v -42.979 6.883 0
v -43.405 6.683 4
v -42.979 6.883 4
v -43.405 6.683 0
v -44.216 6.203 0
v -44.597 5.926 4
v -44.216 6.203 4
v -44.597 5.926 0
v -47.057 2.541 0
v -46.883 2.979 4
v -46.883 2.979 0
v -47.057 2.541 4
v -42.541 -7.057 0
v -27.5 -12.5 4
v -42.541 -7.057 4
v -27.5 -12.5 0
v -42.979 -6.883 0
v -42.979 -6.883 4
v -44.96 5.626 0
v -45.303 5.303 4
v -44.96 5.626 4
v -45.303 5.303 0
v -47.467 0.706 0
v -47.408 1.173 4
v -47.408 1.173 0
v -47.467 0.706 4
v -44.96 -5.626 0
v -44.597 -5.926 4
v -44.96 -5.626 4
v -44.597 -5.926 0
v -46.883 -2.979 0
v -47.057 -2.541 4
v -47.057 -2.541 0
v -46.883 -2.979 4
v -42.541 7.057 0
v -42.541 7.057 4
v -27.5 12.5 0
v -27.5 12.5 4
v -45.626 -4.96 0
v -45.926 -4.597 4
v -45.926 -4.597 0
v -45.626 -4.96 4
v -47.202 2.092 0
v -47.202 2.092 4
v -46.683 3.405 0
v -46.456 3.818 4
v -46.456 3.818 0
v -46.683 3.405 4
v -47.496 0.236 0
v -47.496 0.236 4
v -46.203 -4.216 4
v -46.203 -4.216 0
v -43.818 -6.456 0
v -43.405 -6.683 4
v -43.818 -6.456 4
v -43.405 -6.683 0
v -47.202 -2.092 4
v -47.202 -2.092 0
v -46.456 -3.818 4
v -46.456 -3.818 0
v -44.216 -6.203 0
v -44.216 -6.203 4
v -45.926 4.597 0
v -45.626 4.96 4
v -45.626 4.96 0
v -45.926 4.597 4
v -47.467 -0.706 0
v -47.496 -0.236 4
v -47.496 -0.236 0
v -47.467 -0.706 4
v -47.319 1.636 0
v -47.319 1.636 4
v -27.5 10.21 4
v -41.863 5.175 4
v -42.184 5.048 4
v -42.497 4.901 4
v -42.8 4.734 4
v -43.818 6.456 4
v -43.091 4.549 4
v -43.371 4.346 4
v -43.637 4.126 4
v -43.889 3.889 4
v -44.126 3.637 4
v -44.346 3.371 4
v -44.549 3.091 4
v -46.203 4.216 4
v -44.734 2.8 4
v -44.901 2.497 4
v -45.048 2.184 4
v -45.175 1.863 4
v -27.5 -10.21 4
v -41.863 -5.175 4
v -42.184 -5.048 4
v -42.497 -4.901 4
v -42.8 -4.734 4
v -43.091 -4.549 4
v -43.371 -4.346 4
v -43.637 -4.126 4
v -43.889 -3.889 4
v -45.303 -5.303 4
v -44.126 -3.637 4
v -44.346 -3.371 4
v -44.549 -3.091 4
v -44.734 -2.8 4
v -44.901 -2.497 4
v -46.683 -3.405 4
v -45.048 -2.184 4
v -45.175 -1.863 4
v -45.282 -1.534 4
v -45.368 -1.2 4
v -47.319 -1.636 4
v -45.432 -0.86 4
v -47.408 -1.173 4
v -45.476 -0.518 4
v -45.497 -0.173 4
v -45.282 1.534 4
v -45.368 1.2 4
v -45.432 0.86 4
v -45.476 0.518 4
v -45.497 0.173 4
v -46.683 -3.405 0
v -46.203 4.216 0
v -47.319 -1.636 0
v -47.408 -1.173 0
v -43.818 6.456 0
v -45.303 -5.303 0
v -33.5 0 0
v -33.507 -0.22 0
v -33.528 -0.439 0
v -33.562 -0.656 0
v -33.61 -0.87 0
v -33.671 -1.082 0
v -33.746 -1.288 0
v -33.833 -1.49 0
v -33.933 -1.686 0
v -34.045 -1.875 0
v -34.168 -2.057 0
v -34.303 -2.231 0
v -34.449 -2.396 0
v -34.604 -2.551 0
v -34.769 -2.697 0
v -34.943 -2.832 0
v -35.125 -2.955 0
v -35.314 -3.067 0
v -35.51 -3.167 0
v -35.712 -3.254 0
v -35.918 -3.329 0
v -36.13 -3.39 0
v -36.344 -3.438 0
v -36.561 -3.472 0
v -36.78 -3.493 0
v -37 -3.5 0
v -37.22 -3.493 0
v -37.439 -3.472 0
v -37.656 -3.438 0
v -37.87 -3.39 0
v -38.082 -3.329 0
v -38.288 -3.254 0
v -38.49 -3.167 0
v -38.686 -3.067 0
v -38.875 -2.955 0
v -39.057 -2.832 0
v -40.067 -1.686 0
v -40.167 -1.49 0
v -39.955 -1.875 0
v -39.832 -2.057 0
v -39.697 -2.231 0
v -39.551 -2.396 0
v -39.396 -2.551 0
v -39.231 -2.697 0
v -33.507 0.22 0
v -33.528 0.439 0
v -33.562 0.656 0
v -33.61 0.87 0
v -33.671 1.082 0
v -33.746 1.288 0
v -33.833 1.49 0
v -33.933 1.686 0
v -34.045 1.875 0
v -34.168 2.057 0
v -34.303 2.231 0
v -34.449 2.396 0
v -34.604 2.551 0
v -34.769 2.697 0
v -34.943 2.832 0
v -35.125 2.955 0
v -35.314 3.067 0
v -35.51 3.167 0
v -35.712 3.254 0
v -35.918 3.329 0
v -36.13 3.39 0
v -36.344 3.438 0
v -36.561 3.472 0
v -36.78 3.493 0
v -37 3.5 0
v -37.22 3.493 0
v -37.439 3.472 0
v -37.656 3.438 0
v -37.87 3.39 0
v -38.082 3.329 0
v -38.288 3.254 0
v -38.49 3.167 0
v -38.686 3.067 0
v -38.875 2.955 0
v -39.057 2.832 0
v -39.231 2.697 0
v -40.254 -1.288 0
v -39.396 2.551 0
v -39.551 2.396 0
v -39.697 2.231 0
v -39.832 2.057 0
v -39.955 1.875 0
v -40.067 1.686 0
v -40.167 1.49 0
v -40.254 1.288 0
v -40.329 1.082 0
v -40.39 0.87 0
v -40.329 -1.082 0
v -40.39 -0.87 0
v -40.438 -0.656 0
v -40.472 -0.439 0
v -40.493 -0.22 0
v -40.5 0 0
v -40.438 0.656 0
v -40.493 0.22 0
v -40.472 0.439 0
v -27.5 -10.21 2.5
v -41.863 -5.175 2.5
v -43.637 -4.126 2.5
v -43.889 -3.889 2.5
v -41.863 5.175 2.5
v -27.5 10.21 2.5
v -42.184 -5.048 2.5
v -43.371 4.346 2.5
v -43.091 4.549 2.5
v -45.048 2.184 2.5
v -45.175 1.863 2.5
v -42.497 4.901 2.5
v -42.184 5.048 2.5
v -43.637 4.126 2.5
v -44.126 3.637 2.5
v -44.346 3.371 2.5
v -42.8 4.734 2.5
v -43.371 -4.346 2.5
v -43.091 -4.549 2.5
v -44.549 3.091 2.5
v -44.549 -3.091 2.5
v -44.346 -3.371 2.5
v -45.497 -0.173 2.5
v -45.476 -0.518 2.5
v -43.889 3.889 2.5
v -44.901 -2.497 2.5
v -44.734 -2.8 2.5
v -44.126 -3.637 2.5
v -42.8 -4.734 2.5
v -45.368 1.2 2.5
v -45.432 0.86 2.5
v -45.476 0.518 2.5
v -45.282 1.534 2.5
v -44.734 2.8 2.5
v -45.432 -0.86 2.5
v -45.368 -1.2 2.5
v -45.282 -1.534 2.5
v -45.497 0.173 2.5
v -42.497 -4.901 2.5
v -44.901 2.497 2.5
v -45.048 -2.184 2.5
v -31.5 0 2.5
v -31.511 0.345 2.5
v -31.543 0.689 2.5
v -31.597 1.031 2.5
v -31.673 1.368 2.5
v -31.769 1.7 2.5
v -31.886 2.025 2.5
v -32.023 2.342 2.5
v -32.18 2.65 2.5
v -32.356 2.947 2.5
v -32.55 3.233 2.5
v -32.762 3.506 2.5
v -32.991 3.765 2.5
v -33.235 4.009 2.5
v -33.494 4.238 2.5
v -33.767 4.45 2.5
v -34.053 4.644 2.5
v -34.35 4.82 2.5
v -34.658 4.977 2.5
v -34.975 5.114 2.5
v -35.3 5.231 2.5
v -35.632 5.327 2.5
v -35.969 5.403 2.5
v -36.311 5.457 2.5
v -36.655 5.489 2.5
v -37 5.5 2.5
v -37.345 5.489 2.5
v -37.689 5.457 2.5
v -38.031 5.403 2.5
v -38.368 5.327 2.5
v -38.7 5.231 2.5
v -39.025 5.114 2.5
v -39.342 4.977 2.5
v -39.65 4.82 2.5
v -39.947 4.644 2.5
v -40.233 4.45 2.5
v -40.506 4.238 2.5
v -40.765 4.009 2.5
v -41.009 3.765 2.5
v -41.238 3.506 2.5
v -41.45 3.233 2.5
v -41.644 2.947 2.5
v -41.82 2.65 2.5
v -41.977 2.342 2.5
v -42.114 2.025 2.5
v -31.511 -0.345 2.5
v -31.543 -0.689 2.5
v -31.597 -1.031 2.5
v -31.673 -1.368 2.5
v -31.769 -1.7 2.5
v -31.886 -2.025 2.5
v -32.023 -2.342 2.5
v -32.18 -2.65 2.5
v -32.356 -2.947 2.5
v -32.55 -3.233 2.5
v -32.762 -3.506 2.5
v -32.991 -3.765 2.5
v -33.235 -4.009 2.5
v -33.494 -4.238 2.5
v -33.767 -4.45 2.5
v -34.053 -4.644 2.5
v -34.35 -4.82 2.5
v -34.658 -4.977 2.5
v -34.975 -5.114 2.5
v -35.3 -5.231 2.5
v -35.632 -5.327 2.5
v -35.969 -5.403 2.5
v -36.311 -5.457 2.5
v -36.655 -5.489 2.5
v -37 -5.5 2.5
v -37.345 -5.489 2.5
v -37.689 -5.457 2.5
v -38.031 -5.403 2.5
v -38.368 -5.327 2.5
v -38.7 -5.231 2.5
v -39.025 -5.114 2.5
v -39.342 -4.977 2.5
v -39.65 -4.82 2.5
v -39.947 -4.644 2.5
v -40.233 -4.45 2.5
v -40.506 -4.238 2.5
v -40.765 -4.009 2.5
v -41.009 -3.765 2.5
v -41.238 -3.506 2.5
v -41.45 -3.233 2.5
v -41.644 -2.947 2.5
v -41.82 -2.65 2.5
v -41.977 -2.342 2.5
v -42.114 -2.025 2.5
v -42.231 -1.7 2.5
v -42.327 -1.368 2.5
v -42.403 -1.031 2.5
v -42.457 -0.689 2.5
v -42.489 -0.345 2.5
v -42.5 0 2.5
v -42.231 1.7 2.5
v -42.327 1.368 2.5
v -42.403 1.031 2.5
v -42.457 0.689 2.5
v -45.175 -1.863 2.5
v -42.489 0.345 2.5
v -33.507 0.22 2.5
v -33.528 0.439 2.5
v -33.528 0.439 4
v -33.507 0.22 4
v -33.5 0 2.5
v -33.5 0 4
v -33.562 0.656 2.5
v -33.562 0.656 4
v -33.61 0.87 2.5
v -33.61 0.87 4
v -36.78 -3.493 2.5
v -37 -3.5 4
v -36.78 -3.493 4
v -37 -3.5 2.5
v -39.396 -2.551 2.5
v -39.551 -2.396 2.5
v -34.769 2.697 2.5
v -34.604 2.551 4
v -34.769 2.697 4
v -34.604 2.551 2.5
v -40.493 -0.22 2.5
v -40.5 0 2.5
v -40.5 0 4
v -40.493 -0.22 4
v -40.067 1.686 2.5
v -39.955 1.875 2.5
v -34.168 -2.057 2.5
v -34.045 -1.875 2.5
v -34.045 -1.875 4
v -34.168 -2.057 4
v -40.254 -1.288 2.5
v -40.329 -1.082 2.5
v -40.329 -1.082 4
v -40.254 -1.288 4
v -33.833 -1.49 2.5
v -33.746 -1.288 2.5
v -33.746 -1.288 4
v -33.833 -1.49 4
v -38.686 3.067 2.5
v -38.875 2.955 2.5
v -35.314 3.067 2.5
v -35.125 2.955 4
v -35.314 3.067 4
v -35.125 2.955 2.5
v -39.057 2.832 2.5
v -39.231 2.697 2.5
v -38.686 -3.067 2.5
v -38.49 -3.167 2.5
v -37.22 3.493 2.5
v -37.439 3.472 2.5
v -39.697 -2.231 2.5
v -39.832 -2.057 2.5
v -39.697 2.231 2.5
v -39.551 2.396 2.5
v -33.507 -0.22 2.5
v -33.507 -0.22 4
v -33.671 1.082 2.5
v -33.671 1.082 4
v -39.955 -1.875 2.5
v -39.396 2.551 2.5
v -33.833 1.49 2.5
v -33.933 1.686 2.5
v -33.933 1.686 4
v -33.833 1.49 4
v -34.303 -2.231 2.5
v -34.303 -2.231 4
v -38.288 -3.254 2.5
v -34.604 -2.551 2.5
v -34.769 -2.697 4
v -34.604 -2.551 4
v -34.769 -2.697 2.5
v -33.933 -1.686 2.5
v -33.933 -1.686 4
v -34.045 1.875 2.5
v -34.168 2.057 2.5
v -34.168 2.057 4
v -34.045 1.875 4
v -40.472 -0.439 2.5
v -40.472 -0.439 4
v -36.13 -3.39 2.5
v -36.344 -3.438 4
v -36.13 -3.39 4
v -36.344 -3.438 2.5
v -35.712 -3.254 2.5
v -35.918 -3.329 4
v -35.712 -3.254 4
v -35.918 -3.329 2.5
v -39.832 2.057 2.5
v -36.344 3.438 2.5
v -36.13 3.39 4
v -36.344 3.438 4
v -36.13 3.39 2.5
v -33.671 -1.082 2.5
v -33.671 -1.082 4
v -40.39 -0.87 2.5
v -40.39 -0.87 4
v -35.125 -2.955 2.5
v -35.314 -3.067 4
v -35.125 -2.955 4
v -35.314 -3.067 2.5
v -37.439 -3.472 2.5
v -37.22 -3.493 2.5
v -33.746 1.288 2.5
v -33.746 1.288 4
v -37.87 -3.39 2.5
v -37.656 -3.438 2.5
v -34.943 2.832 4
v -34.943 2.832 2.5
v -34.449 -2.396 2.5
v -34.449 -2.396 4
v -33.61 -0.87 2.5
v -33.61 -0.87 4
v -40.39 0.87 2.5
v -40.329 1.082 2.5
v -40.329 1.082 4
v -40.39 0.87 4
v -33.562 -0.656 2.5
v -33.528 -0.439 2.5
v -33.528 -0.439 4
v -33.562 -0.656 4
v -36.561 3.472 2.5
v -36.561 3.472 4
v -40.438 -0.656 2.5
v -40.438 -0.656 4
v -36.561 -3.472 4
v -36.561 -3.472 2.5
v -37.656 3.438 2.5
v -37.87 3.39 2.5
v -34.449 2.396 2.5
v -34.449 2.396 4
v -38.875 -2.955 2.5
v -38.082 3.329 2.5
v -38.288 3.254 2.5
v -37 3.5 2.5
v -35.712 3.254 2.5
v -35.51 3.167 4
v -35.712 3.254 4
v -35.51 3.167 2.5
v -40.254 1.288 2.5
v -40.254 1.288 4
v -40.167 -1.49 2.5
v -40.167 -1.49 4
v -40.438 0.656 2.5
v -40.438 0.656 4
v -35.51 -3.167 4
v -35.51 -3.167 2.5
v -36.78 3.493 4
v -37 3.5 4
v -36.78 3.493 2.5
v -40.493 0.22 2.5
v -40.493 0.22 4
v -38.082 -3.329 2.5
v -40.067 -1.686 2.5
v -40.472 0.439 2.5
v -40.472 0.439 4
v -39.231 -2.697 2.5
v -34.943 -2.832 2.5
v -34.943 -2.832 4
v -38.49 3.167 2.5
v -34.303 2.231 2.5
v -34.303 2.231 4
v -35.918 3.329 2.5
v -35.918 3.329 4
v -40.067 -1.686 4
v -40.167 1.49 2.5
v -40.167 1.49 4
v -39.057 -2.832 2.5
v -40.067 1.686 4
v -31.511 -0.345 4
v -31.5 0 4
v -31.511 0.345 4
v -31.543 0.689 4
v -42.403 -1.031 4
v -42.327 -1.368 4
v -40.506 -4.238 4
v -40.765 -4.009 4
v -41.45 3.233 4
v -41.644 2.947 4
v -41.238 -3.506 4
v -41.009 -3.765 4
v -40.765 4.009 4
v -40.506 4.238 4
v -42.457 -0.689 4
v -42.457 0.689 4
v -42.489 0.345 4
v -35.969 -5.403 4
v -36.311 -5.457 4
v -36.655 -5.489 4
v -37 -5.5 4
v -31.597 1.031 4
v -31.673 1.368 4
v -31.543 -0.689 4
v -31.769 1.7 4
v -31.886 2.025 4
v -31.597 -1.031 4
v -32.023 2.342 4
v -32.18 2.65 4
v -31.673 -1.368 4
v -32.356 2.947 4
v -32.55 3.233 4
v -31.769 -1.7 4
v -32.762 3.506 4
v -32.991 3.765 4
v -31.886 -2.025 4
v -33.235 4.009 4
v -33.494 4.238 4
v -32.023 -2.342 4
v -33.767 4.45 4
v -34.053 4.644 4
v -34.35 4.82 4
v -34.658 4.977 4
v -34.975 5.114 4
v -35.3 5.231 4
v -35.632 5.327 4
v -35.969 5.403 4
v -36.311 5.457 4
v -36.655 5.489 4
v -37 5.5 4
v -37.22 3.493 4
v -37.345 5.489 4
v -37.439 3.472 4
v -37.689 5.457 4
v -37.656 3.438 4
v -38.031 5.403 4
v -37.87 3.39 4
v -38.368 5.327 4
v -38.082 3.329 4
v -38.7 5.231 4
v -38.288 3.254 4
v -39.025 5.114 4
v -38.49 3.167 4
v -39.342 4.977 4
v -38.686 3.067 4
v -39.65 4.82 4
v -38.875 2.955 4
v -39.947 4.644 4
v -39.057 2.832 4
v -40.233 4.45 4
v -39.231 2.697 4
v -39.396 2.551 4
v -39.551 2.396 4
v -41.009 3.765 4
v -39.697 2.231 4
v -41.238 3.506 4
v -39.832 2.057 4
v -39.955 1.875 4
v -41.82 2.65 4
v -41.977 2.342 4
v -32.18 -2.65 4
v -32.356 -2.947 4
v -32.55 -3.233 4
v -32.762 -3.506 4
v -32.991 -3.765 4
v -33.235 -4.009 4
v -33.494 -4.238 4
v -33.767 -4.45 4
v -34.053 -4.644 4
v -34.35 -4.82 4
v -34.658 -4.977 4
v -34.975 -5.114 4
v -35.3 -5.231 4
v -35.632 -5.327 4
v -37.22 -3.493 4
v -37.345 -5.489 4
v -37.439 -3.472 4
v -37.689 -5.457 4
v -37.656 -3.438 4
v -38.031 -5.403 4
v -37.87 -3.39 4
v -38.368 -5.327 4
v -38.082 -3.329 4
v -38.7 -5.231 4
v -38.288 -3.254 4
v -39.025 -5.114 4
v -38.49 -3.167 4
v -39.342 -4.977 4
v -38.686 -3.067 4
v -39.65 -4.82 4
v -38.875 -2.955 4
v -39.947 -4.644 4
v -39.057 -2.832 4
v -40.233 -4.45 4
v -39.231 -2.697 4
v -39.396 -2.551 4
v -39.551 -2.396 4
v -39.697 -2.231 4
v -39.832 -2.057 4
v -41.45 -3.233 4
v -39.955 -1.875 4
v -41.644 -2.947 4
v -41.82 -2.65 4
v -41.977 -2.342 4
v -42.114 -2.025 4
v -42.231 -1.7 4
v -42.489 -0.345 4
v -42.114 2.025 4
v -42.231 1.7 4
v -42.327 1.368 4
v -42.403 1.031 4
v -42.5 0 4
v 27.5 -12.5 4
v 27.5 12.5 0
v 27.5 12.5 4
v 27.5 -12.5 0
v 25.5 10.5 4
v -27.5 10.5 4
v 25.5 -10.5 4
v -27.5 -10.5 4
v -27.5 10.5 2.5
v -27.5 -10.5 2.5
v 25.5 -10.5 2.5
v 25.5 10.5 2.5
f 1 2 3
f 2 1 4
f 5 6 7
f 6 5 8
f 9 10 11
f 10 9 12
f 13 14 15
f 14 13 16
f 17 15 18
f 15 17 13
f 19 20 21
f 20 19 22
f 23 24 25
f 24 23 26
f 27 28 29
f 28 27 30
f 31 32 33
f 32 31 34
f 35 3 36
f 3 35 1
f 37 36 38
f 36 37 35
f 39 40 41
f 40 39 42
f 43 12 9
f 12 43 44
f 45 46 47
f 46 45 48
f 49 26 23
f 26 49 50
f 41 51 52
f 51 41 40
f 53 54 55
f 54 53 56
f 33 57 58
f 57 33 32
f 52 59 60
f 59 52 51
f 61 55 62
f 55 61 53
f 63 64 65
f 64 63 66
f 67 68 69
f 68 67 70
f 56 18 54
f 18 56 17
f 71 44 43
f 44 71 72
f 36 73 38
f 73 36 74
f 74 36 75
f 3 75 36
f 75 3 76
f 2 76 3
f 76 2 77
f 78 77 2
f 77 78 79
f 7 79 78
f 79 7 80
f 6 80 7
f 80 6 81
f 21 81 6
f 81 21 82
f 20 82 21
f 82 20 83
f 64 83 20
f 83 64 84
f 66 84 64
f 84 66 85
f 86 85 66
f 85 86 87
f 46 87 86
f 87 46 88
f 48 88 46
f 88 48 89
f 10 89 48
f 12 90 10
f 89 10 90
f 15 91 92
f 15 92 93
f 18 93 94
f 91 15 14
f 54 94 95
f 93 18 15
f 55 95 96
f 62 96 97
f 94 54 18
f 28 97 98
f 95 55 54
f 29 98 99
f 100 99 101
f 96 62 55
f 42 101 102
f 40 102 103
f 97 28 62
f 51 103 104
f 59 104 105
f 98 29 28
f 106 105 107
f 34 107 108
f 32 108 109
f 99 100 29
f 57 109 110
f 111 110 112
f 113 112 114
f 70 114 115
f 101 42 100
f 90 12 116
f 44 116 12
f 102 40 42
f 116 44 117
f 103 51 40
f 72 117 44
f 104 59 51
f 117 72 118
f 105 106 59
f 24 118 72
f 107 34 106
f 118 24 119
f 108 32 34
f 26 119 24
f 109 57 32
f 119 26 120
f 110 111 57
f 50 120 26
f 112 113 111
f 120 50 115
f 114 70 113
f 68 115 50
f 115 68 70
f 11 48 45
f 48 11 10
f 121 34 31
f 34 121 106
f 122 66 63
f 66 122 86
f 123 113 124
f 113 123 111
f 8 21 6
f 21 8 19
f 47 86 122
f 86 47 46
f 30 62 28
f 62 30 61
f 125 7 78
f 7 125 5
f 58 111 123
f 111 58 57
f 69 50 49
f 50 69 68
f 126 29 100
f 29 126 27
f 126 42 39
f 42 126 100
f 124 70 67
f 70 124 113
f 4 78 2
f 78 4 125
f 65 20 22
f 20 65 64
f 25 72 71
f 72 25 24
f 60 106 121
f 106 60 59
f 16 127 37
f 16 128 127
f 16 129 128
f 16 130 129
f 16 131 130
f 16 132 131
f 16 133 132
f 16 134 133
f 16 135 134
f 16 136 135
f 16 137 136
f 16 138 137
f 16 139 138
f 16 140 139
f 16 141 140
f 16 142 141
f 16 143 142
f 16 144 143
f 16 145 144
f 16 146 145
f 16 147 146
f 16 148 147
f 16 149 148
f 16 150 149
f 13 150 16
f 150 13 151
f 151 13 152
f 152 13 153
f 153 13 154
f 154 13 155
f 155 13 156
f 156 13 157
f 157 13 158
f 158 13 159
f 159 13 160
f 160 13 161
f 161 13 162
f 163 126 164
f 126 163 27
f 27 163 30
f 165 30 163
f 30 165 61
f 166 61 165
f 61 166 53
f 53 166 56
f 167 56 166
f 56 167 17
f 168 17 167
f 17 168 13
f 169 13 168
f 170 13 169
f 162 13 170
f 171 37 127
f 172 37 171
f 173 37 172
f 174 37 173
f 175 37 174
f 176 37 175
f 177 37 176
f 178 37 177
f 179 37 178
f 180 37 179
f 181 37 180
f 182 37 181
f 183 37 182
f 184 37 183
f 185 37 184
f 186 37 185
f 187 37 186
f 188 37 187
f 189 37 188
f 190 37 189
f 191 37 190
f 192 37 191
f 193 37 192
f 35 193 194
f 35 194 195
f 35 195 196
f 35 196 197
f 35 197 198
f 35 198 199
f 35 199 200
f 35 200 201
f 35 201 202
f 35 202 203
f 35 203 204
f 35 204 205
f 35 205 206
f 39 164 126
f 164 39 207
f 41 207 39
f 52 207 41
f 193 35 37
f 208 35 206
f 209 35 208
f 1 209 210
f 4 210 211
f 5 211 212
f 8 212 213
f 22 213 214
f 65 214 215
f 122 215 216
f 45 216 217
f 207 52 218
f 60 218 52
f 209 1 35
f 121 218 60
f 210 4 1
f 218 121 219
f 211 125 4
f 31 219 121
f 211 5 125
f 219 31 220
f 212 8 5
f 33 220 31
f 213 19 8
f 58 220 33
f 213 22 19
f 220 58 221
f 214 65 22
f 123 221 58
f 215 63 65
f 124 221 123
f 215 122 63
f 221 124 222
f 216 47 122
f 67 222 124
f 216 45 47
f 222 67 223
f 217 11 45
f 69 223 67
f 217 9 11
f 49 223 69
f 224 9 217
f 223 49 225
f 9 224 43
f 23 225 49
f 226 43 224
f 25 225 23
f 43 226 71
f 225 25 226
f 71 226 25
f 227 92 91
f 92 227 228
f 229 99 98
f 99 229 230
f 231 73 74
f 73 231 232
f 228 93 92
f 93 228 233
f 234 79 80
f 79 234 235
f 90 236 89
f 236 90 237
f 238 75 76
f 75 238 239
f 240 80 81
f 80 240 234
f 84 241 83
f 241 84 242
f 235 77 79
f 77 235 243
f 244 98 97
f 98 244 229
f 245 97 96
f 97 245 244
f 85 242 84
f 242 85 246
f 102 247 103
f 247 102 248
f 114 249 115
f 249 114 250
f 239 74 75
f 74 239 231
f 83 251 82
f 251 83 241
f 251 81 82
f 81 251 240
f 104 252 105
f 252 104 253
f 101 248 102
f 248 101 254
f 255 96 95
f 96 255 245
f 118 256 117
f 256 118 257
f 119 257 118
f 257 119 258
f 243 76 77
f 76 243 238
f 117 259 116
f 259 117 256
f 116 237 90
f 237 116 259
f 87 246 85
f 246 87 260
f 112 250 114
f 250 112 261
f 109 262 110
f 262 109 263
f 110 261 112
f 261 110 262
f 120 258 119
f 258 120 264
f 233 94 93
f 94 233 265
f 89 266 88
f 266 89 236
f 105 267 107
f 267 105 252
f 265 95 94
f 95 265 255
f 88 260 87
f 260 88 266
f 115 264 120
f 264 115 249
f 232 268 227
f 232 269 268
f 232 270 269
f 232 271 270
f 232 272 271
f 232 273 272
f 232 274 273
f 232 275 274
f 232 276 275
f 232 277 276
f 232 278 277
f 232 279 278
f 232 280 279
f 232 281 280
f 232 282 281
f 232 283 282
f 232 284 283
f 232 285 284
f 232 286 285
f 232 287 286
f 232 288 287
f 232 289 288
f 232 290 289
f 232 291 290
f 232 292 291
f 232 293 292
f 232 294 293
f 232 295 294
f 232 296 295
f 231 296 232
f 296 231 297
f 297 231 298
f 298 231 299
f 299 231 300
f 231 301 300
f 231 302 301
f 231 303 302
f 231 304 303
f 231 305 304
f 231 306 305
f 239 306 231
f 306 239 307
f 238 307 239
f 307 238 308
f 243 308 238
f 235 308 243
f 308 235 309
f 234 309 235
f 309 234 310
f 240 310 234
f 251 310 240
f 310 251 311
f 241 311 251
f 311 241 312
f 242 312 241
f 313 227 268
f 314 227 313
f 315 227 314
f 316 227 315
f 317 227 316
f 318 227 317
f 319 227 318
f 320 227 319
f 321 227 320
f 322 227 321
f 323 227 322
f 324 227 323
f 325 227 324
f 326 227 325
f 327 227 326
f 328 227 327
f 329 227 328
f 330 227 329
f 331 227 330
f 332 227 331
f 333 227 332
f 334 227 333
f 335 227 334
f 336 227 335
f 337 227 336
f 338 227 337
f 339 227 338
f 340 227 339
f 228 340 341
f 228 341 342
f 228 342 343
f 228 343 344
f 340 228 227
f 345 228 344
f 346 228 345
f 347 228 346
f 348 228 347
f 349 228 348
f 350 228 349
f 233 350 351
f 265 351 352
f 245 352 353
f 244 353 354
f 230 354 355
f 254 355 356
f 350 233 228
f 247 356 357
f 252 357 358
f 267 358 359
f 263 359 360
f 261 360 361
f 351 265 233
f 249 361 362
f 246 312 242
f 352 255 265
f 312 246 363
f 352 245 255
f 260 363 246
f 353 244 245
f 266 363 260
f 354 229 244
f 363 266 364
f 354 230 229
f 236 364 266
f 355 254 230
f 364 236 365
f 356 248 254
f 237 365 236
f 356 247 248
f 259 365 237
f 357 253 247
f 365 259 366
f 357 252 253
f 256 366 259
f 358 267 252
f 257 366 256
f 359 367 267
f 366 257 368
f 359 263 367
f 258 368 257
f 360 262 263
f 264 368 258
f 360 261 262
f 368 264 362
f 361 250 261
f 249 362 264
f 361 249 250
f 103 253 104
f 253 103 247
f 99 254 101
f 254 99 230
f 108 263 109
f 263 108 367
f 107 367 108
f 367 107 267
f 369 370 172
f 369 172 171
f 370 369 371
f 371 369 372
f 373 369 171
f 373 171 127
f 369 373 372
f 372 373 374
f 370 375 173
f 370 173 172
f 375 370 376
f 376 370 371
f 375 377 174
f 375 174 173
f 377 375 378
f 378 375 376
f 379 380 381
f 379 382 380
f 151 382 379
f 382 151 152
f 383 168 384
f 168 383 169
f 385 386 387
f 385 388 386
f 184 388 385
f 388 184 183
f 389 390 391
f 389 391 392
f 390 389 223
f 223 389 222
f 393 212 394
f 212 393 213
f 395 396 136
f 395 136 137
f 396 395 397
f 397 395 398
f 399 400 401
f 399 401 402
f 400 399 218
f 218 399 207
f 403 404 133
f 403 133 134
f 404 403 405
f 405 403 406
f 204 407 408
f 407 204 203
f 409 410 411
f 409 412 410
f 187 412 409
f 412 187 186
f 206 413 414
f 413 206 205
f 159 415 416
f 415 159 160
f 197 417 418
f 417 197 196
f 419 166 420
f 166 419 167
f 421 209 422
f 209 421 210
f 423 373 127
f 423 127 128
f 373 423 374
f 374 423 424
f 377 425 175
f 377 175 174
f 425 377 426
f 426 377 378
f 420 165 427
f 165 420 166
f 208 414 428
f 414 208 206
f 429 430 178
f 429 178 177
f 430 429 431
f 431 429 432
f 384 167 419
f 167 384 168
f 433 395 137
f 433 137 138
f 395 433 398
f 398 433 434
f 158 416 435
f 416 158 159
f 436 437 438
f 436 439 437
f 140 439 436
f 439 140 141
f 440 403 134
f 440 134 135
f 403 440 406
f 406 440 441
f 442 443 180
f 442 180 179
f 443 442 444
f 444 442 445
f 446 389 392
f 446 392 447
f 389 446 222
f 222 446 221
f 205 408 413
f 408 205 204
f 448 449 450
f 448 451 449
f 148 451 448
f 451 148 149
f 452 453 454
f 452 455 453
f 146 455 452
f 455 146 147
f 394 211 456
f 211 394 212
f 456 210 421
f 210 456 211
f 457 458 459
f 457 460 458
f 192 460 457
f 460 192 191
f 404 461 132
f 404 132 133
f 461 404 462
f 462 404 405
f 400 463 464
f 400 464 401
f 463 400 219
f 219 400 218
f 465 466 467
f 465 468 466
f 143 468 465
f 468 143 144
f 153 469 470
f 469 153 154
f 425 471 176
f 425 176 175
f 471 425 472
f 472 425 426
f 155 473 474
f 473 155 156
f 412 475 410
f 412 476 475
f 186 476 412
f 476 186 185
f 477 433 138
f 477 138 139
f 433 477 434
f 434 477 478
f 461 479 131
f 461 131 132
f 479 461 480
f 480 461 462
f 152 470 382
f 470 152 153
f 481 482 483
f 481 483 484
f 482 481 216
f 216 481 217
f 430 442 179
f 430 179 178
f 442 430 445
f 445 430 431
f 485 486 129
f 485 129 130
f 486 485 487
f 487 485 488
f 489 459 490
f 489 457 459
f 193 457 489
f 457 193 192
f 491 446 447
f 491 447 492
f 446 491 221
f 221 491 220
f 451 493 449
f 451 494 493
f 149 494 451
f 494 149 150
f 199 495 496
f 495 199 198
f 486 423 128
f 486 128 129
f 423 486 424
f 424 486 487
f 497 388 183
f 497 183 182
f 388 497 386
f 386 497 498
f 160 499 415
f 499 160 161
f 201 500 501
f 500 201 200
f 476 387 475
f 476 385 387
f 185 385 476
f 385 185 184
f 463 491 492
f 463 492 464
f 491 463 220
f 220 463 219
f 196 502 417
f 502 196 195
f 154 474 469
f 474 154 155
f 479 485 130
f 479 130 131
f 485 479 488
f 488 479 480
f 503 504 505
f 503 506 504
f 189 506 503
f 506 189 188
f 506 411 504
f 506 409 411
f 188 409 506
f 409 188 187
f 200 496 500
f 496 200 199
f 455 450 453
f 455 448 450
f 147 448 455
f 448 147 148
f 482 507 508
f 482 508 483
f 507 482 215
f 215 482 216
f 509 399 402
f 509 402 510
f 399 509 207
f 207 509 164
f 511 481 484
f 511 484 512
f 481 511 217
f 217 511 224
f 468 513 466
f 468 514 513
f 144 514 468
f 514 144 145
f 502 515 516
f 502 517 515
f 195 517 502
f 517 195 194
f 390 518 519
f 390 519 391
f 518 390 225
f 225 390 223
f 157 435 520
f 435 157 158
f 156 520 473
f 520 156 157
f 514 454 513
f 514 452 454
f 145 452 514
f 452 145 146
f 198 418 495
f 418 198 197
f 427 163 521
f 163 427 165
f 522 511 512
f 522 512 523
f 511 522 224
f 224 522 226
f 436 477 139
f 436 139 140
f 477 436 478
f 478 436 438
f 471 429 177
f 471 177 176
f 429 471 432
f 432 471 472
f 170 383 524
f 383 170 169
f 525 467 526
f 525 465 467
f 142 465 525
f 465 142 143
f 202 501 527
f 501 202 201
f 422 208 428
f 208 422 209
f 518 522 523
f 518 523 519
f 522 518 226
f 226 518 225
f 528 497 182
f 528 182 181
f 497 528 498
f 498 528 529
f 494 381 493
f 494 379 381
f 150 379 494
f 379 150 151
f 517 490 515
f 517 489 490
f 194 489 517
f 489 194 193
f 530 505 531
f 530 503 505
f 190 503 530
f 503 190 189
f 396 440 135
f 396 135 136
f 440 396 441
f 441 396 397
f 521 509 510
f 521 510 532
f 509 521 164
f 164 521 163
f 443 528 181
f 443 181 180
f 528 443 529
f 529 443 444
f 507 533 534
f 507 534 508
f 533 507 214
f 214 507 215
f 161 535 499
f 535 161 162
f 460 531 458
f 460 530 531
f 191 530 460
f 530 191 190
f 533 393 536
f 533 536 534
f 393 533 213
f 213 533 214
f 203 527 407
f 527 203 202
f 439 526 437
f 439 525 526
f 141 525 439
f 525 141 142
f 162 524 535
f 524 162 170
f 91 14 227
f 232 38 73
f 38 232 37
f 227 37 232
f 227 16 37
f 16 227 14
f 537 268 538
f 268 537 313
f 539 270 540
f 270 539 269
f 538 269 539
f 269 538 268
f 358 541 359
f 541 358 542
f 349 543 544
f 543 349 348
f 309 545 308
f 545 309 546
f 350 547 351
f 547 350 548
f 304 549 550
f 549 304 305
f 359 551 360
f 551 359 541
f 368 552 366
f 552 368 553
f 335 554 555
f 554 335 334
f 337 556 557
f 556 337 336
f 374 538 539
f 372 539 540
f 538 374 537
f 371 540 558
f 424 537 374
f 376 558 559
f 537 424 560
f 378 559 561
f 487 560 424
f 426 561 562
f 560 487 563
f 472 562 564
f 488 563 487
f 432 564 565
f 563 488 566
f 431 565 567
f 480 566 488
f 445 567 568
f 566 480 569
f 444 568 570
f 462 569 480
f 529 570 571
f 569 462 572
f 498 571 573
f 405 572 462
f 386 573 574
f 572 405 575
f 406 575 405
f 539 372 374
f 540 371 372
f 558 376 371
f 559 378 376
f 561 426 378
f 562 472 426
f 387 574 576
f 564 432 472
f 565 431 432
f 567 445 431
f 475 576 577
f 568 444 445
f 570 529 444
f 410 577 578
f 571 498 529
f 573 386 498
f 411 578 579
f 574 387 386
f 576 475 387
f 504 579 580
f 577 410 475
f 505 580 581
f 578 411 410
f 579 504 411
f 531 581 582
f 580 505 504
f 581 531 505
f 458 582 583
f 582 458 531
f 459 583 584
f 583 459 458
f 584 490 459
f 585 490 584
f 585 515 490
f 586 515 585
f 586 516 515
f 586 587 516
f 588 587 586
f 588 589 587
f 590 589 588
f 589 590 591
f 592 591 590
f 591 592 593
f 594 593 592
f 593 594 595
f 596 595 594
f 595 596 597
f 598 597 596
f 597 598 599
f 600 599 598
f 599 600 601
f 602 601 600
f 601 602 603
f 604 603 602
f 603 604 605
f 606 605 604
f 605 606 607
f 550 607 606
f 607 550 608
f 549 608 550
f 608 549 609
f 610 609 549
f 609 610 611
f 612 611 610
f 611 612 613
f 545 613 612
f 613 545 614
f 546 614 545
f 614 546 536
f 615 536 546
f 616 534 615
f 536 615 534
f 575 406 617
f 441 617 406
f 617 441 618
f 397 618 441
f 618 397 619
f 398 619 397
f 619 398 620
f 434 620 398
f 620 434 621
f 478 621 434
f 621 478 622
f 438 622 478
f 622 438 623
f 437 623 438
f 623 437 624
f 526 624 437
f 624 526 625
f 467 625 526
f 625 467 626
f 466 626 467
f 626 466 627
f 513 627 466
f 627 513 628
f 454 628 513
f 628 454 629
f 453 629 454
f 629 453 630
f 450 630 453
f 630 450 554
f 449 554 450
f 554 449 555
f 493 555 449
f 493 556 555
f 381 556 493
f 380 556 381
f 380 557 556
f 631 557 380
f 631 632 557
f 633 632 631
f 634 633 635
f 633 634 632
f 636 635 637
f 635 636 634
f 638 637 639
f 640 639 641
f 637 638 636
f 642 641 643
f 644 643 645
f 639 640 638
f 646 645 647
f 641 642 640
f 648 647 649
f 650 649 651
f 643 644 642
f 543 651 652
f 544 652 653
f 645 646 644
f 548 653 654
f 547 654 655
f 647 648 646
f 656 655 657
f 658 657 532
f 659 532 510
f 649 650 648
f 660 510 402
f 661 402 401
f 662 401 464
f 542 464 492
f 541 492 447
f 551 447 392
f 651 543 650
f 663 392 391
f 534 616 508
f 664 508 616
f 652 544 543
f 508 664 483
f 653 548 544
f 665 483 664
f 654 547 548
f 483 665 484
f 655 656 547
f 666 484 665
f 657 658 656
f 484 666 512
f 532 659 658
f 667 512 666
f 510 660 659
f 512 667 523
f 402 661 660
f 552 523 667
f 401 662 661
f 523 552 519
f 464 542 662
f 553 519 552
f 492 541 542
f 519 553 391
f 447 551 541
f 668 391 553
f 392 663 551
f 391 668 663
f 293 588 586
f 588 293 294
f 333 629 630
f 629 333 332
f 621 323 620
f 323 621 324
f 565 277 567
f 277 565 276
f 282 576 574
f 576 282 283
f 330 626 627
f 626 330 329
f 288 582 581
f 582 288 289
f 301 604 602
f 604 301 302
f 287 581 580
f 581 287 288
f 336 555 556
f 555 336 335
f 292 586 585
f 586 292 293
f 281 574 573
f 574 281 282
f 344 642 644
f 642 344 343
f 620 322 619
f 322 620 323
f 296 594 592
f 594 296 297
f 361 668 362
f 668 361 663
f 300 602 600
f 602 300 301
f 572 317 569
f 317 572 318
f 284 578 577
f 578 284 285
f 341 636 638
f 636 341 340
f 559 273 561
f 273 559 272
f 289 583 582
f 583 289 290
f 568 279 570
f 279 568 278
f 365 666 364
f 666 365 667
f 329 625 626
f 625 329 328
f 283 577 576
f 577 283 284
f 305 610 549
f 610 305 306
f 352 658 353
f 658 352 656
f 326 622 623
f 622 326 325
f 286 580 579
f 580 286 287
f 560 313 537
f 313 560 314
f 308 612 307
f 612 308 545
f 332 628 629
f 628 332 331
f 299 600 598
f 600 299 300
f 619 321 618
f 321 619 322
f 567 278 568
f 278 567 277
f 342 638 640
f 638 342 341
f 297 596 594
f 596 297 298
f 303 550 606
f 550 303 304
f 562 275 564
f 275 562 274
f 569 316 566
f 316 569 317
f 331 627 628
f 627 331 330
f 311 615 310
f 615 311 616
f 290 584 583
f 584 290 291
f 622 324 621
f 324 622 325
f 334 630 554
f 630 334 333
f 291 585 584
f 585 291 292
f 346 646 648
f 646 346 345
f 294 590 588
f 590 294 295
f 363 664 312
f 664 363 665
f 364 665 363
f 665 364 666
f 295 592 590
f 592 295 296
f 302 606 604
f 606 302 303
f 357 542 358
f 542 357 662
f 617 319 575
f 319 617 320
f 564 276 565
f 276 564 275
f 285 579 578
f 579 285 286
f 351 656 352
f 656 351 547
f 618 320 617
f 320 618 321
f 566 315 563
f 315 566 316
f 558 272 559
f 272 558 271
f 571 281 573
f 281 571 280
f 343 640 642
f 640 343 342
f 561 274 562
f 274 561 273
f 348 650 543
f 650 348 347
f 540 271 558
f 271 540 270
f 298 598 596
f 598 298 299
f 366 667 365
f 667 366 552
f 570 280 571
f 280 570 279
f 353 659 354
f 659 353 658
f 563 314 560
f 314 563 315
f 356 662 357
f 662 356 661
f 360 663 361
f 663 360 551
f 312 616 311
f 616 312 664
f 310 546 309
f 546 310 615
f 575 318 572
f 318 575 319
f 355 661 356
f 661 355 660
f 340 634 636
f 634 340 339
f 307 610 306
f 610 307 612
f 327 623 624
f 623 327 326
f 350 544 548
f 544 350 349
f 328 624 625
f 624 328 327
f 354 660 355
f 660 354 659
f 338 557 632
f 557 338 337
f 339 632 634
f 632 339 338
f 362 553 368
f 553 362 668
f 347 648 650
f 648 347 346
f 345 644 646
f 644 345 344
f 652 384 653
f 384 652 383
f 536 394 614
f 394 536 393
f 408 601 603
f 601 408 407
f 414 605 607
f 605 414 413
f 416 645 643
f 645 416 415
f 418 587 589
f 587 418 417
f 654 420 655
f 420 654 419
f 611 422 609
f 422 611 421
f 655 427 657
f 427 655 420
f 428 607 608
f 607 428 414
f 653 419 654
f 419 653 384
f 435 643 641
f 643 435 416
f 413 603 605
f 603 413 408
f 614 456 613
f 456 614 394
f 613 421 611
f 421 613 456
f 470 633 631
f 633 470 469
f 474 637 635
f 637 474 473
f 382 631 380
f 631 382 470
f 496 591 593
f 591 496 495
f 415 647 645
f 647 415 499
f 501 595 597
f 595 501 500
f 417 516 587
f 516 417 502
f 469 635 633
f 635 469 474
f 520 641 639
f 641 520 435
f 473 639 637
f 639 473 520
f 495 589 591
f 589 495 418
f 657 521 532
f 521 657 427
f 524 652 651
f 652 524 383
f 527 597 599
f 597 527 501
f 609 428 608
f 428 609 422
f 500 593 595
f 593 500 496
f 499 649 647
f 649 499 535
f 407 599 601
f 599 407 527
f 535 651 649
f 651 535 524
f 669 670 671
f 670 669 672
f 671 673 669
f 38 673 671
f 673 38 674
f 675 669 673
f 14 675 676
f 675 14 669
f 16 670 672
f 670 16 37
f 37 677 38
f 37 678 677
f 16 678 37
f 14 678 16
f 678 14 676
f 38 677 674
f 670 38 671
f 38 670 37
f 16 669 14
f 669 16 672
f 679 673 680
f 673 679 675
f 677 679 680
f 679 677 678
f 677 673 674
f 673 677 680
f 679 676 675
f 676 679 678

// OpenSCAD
/* 
* (c) Copyright 2015 So Make It Limited
*
* This program is free software: you can redistribute it and/or modify
* it under the terms of the GNU General Public License as published by
* the Free Software Foundation, either version 3 of the License, or
* (at your option) any later version.
*
* This program is distributed in the hope that it will be useful,
* but WITHOUT ANY WARRANTY; without even the implied warranty of
* MERCHANTABILITY or FITNESS FOR A PARTICULAR PURPOSE.  See the
* GNU General Public License for more details.
*
* You should have received a copy of the GNU General Public License
* along with this program.  If not, see <http://www.gnu.org/licenses/>.
*/


keyring_length	        =  55;   // mm  the main body of the keyring, not the tag
keyring_width		=  25;   // mm
keyring_thickness	=   4.0; // mm
keyring_border_width    =   2.0; // mm
keyring_border_height   =   1.5; // mm

keyring_tag_r           =   7.5; //mm
keyring_hole_r          =   3.5; //mm
// another offset so the hole_x_offset is really the mid point of the
// cylinder used to produce the hull rather than the hole itself
additional_x_offset     =   3.0; // mm

image_file              = "mylogo.png";
image_length            = 158 * 2.0; //mm
image_width             =  73 * 2.0; //mm

pi = 3.142;

tag_l = keyring_width / sqrt(2.0);
tag_r = (keyring_width - keyring_border_width * 2.0) / sqrt(2.0);

hole_x_offset = sqrt(tag_l * tag_l - (keyring_width / 2.0) * (keyring_width / 2.0));
inner_x_offset = sqrt(tag_r * tag_r - (keyring_width / 2.0 - keyring_border_width) * (keyring_width / 2.0 - keyring_border_width));

$fn = 100;
                        
union() {
    
    translate ([-keyring_length / 2.0 - hole_x_offset, 0, 0]) {
        difference() {
            rotate([0, 0, 45.0 + 270.0]) {
                difference() {
                    hull() {
                        cube([tag_l, tag_l, keyring_thickness]);
                        cylinder(r = keyring_tag_r, h = keyring_thickness);
                    }
                    translate([0,
                                0,
                                keyring_thickness - keyring_border_height]) {
                        hull() {
                            translate([keyring_border_width, keyring_border_width, 0]) {
                                cube([tag_r, tag_r, keyring_thickness]);
                            }
                            translate([0, 0, 0]) {
                                cylinder(r = keyring_tag_r - keyring_border_width, h = keyring_thickness);
                               
                            }
                        }
                    }
                }
            }
            // hole
            translate([additional_x_offset, 0, 0]) cylinder(r = keyring_hole_r, h = keyring_thickness);
            // cut off remainder
            translate([2.0 * hole_x_offset, 0, keyring_thickness / 2.0]) {
                cube([keyring_width, keyring_width, keyring_thickness], center = true);
            }
        }
    }
    
    // add a collar around the hole
    translate([-keyring_length / 2.0 - hole_x_offset + additional_x_offset, 0, keyring_thickness - keyring_border_height]) {
        difference() {
            cylinder(r = keyring_hole_r + keyring_border_width, h = keyring_border_height);
            cylinder(r = keyring_hole_r, h = keyring_border_height);
        }
    }
    
    translate([0, 0, keyring_thickness - keyring_border_height]) {
        logo();
    }
    
    difference() {
        translate([0, 0, keyring_thickness / 2.0])
            cube([keyring_length,
                    keyring_width,
                    keyring_thickness], center=true);
        translate([-keyring_border_width / 2.0, 0, keyring_thickness - 0.5 * keyring_border_height ])
            cube([keyring_length - keyring_border_width,
                    keyring_width - (2.0 * keyring_border_width),
                    keyring_border_height], center=true);
    }
}
          

module logo() {
    
    // lazy
    scale([keyring_length / image_length, keyring_width / image_width, keyring_border_height / 100.0]) {
        surface(file = image_file, center = true, invert = false);
    }
}
